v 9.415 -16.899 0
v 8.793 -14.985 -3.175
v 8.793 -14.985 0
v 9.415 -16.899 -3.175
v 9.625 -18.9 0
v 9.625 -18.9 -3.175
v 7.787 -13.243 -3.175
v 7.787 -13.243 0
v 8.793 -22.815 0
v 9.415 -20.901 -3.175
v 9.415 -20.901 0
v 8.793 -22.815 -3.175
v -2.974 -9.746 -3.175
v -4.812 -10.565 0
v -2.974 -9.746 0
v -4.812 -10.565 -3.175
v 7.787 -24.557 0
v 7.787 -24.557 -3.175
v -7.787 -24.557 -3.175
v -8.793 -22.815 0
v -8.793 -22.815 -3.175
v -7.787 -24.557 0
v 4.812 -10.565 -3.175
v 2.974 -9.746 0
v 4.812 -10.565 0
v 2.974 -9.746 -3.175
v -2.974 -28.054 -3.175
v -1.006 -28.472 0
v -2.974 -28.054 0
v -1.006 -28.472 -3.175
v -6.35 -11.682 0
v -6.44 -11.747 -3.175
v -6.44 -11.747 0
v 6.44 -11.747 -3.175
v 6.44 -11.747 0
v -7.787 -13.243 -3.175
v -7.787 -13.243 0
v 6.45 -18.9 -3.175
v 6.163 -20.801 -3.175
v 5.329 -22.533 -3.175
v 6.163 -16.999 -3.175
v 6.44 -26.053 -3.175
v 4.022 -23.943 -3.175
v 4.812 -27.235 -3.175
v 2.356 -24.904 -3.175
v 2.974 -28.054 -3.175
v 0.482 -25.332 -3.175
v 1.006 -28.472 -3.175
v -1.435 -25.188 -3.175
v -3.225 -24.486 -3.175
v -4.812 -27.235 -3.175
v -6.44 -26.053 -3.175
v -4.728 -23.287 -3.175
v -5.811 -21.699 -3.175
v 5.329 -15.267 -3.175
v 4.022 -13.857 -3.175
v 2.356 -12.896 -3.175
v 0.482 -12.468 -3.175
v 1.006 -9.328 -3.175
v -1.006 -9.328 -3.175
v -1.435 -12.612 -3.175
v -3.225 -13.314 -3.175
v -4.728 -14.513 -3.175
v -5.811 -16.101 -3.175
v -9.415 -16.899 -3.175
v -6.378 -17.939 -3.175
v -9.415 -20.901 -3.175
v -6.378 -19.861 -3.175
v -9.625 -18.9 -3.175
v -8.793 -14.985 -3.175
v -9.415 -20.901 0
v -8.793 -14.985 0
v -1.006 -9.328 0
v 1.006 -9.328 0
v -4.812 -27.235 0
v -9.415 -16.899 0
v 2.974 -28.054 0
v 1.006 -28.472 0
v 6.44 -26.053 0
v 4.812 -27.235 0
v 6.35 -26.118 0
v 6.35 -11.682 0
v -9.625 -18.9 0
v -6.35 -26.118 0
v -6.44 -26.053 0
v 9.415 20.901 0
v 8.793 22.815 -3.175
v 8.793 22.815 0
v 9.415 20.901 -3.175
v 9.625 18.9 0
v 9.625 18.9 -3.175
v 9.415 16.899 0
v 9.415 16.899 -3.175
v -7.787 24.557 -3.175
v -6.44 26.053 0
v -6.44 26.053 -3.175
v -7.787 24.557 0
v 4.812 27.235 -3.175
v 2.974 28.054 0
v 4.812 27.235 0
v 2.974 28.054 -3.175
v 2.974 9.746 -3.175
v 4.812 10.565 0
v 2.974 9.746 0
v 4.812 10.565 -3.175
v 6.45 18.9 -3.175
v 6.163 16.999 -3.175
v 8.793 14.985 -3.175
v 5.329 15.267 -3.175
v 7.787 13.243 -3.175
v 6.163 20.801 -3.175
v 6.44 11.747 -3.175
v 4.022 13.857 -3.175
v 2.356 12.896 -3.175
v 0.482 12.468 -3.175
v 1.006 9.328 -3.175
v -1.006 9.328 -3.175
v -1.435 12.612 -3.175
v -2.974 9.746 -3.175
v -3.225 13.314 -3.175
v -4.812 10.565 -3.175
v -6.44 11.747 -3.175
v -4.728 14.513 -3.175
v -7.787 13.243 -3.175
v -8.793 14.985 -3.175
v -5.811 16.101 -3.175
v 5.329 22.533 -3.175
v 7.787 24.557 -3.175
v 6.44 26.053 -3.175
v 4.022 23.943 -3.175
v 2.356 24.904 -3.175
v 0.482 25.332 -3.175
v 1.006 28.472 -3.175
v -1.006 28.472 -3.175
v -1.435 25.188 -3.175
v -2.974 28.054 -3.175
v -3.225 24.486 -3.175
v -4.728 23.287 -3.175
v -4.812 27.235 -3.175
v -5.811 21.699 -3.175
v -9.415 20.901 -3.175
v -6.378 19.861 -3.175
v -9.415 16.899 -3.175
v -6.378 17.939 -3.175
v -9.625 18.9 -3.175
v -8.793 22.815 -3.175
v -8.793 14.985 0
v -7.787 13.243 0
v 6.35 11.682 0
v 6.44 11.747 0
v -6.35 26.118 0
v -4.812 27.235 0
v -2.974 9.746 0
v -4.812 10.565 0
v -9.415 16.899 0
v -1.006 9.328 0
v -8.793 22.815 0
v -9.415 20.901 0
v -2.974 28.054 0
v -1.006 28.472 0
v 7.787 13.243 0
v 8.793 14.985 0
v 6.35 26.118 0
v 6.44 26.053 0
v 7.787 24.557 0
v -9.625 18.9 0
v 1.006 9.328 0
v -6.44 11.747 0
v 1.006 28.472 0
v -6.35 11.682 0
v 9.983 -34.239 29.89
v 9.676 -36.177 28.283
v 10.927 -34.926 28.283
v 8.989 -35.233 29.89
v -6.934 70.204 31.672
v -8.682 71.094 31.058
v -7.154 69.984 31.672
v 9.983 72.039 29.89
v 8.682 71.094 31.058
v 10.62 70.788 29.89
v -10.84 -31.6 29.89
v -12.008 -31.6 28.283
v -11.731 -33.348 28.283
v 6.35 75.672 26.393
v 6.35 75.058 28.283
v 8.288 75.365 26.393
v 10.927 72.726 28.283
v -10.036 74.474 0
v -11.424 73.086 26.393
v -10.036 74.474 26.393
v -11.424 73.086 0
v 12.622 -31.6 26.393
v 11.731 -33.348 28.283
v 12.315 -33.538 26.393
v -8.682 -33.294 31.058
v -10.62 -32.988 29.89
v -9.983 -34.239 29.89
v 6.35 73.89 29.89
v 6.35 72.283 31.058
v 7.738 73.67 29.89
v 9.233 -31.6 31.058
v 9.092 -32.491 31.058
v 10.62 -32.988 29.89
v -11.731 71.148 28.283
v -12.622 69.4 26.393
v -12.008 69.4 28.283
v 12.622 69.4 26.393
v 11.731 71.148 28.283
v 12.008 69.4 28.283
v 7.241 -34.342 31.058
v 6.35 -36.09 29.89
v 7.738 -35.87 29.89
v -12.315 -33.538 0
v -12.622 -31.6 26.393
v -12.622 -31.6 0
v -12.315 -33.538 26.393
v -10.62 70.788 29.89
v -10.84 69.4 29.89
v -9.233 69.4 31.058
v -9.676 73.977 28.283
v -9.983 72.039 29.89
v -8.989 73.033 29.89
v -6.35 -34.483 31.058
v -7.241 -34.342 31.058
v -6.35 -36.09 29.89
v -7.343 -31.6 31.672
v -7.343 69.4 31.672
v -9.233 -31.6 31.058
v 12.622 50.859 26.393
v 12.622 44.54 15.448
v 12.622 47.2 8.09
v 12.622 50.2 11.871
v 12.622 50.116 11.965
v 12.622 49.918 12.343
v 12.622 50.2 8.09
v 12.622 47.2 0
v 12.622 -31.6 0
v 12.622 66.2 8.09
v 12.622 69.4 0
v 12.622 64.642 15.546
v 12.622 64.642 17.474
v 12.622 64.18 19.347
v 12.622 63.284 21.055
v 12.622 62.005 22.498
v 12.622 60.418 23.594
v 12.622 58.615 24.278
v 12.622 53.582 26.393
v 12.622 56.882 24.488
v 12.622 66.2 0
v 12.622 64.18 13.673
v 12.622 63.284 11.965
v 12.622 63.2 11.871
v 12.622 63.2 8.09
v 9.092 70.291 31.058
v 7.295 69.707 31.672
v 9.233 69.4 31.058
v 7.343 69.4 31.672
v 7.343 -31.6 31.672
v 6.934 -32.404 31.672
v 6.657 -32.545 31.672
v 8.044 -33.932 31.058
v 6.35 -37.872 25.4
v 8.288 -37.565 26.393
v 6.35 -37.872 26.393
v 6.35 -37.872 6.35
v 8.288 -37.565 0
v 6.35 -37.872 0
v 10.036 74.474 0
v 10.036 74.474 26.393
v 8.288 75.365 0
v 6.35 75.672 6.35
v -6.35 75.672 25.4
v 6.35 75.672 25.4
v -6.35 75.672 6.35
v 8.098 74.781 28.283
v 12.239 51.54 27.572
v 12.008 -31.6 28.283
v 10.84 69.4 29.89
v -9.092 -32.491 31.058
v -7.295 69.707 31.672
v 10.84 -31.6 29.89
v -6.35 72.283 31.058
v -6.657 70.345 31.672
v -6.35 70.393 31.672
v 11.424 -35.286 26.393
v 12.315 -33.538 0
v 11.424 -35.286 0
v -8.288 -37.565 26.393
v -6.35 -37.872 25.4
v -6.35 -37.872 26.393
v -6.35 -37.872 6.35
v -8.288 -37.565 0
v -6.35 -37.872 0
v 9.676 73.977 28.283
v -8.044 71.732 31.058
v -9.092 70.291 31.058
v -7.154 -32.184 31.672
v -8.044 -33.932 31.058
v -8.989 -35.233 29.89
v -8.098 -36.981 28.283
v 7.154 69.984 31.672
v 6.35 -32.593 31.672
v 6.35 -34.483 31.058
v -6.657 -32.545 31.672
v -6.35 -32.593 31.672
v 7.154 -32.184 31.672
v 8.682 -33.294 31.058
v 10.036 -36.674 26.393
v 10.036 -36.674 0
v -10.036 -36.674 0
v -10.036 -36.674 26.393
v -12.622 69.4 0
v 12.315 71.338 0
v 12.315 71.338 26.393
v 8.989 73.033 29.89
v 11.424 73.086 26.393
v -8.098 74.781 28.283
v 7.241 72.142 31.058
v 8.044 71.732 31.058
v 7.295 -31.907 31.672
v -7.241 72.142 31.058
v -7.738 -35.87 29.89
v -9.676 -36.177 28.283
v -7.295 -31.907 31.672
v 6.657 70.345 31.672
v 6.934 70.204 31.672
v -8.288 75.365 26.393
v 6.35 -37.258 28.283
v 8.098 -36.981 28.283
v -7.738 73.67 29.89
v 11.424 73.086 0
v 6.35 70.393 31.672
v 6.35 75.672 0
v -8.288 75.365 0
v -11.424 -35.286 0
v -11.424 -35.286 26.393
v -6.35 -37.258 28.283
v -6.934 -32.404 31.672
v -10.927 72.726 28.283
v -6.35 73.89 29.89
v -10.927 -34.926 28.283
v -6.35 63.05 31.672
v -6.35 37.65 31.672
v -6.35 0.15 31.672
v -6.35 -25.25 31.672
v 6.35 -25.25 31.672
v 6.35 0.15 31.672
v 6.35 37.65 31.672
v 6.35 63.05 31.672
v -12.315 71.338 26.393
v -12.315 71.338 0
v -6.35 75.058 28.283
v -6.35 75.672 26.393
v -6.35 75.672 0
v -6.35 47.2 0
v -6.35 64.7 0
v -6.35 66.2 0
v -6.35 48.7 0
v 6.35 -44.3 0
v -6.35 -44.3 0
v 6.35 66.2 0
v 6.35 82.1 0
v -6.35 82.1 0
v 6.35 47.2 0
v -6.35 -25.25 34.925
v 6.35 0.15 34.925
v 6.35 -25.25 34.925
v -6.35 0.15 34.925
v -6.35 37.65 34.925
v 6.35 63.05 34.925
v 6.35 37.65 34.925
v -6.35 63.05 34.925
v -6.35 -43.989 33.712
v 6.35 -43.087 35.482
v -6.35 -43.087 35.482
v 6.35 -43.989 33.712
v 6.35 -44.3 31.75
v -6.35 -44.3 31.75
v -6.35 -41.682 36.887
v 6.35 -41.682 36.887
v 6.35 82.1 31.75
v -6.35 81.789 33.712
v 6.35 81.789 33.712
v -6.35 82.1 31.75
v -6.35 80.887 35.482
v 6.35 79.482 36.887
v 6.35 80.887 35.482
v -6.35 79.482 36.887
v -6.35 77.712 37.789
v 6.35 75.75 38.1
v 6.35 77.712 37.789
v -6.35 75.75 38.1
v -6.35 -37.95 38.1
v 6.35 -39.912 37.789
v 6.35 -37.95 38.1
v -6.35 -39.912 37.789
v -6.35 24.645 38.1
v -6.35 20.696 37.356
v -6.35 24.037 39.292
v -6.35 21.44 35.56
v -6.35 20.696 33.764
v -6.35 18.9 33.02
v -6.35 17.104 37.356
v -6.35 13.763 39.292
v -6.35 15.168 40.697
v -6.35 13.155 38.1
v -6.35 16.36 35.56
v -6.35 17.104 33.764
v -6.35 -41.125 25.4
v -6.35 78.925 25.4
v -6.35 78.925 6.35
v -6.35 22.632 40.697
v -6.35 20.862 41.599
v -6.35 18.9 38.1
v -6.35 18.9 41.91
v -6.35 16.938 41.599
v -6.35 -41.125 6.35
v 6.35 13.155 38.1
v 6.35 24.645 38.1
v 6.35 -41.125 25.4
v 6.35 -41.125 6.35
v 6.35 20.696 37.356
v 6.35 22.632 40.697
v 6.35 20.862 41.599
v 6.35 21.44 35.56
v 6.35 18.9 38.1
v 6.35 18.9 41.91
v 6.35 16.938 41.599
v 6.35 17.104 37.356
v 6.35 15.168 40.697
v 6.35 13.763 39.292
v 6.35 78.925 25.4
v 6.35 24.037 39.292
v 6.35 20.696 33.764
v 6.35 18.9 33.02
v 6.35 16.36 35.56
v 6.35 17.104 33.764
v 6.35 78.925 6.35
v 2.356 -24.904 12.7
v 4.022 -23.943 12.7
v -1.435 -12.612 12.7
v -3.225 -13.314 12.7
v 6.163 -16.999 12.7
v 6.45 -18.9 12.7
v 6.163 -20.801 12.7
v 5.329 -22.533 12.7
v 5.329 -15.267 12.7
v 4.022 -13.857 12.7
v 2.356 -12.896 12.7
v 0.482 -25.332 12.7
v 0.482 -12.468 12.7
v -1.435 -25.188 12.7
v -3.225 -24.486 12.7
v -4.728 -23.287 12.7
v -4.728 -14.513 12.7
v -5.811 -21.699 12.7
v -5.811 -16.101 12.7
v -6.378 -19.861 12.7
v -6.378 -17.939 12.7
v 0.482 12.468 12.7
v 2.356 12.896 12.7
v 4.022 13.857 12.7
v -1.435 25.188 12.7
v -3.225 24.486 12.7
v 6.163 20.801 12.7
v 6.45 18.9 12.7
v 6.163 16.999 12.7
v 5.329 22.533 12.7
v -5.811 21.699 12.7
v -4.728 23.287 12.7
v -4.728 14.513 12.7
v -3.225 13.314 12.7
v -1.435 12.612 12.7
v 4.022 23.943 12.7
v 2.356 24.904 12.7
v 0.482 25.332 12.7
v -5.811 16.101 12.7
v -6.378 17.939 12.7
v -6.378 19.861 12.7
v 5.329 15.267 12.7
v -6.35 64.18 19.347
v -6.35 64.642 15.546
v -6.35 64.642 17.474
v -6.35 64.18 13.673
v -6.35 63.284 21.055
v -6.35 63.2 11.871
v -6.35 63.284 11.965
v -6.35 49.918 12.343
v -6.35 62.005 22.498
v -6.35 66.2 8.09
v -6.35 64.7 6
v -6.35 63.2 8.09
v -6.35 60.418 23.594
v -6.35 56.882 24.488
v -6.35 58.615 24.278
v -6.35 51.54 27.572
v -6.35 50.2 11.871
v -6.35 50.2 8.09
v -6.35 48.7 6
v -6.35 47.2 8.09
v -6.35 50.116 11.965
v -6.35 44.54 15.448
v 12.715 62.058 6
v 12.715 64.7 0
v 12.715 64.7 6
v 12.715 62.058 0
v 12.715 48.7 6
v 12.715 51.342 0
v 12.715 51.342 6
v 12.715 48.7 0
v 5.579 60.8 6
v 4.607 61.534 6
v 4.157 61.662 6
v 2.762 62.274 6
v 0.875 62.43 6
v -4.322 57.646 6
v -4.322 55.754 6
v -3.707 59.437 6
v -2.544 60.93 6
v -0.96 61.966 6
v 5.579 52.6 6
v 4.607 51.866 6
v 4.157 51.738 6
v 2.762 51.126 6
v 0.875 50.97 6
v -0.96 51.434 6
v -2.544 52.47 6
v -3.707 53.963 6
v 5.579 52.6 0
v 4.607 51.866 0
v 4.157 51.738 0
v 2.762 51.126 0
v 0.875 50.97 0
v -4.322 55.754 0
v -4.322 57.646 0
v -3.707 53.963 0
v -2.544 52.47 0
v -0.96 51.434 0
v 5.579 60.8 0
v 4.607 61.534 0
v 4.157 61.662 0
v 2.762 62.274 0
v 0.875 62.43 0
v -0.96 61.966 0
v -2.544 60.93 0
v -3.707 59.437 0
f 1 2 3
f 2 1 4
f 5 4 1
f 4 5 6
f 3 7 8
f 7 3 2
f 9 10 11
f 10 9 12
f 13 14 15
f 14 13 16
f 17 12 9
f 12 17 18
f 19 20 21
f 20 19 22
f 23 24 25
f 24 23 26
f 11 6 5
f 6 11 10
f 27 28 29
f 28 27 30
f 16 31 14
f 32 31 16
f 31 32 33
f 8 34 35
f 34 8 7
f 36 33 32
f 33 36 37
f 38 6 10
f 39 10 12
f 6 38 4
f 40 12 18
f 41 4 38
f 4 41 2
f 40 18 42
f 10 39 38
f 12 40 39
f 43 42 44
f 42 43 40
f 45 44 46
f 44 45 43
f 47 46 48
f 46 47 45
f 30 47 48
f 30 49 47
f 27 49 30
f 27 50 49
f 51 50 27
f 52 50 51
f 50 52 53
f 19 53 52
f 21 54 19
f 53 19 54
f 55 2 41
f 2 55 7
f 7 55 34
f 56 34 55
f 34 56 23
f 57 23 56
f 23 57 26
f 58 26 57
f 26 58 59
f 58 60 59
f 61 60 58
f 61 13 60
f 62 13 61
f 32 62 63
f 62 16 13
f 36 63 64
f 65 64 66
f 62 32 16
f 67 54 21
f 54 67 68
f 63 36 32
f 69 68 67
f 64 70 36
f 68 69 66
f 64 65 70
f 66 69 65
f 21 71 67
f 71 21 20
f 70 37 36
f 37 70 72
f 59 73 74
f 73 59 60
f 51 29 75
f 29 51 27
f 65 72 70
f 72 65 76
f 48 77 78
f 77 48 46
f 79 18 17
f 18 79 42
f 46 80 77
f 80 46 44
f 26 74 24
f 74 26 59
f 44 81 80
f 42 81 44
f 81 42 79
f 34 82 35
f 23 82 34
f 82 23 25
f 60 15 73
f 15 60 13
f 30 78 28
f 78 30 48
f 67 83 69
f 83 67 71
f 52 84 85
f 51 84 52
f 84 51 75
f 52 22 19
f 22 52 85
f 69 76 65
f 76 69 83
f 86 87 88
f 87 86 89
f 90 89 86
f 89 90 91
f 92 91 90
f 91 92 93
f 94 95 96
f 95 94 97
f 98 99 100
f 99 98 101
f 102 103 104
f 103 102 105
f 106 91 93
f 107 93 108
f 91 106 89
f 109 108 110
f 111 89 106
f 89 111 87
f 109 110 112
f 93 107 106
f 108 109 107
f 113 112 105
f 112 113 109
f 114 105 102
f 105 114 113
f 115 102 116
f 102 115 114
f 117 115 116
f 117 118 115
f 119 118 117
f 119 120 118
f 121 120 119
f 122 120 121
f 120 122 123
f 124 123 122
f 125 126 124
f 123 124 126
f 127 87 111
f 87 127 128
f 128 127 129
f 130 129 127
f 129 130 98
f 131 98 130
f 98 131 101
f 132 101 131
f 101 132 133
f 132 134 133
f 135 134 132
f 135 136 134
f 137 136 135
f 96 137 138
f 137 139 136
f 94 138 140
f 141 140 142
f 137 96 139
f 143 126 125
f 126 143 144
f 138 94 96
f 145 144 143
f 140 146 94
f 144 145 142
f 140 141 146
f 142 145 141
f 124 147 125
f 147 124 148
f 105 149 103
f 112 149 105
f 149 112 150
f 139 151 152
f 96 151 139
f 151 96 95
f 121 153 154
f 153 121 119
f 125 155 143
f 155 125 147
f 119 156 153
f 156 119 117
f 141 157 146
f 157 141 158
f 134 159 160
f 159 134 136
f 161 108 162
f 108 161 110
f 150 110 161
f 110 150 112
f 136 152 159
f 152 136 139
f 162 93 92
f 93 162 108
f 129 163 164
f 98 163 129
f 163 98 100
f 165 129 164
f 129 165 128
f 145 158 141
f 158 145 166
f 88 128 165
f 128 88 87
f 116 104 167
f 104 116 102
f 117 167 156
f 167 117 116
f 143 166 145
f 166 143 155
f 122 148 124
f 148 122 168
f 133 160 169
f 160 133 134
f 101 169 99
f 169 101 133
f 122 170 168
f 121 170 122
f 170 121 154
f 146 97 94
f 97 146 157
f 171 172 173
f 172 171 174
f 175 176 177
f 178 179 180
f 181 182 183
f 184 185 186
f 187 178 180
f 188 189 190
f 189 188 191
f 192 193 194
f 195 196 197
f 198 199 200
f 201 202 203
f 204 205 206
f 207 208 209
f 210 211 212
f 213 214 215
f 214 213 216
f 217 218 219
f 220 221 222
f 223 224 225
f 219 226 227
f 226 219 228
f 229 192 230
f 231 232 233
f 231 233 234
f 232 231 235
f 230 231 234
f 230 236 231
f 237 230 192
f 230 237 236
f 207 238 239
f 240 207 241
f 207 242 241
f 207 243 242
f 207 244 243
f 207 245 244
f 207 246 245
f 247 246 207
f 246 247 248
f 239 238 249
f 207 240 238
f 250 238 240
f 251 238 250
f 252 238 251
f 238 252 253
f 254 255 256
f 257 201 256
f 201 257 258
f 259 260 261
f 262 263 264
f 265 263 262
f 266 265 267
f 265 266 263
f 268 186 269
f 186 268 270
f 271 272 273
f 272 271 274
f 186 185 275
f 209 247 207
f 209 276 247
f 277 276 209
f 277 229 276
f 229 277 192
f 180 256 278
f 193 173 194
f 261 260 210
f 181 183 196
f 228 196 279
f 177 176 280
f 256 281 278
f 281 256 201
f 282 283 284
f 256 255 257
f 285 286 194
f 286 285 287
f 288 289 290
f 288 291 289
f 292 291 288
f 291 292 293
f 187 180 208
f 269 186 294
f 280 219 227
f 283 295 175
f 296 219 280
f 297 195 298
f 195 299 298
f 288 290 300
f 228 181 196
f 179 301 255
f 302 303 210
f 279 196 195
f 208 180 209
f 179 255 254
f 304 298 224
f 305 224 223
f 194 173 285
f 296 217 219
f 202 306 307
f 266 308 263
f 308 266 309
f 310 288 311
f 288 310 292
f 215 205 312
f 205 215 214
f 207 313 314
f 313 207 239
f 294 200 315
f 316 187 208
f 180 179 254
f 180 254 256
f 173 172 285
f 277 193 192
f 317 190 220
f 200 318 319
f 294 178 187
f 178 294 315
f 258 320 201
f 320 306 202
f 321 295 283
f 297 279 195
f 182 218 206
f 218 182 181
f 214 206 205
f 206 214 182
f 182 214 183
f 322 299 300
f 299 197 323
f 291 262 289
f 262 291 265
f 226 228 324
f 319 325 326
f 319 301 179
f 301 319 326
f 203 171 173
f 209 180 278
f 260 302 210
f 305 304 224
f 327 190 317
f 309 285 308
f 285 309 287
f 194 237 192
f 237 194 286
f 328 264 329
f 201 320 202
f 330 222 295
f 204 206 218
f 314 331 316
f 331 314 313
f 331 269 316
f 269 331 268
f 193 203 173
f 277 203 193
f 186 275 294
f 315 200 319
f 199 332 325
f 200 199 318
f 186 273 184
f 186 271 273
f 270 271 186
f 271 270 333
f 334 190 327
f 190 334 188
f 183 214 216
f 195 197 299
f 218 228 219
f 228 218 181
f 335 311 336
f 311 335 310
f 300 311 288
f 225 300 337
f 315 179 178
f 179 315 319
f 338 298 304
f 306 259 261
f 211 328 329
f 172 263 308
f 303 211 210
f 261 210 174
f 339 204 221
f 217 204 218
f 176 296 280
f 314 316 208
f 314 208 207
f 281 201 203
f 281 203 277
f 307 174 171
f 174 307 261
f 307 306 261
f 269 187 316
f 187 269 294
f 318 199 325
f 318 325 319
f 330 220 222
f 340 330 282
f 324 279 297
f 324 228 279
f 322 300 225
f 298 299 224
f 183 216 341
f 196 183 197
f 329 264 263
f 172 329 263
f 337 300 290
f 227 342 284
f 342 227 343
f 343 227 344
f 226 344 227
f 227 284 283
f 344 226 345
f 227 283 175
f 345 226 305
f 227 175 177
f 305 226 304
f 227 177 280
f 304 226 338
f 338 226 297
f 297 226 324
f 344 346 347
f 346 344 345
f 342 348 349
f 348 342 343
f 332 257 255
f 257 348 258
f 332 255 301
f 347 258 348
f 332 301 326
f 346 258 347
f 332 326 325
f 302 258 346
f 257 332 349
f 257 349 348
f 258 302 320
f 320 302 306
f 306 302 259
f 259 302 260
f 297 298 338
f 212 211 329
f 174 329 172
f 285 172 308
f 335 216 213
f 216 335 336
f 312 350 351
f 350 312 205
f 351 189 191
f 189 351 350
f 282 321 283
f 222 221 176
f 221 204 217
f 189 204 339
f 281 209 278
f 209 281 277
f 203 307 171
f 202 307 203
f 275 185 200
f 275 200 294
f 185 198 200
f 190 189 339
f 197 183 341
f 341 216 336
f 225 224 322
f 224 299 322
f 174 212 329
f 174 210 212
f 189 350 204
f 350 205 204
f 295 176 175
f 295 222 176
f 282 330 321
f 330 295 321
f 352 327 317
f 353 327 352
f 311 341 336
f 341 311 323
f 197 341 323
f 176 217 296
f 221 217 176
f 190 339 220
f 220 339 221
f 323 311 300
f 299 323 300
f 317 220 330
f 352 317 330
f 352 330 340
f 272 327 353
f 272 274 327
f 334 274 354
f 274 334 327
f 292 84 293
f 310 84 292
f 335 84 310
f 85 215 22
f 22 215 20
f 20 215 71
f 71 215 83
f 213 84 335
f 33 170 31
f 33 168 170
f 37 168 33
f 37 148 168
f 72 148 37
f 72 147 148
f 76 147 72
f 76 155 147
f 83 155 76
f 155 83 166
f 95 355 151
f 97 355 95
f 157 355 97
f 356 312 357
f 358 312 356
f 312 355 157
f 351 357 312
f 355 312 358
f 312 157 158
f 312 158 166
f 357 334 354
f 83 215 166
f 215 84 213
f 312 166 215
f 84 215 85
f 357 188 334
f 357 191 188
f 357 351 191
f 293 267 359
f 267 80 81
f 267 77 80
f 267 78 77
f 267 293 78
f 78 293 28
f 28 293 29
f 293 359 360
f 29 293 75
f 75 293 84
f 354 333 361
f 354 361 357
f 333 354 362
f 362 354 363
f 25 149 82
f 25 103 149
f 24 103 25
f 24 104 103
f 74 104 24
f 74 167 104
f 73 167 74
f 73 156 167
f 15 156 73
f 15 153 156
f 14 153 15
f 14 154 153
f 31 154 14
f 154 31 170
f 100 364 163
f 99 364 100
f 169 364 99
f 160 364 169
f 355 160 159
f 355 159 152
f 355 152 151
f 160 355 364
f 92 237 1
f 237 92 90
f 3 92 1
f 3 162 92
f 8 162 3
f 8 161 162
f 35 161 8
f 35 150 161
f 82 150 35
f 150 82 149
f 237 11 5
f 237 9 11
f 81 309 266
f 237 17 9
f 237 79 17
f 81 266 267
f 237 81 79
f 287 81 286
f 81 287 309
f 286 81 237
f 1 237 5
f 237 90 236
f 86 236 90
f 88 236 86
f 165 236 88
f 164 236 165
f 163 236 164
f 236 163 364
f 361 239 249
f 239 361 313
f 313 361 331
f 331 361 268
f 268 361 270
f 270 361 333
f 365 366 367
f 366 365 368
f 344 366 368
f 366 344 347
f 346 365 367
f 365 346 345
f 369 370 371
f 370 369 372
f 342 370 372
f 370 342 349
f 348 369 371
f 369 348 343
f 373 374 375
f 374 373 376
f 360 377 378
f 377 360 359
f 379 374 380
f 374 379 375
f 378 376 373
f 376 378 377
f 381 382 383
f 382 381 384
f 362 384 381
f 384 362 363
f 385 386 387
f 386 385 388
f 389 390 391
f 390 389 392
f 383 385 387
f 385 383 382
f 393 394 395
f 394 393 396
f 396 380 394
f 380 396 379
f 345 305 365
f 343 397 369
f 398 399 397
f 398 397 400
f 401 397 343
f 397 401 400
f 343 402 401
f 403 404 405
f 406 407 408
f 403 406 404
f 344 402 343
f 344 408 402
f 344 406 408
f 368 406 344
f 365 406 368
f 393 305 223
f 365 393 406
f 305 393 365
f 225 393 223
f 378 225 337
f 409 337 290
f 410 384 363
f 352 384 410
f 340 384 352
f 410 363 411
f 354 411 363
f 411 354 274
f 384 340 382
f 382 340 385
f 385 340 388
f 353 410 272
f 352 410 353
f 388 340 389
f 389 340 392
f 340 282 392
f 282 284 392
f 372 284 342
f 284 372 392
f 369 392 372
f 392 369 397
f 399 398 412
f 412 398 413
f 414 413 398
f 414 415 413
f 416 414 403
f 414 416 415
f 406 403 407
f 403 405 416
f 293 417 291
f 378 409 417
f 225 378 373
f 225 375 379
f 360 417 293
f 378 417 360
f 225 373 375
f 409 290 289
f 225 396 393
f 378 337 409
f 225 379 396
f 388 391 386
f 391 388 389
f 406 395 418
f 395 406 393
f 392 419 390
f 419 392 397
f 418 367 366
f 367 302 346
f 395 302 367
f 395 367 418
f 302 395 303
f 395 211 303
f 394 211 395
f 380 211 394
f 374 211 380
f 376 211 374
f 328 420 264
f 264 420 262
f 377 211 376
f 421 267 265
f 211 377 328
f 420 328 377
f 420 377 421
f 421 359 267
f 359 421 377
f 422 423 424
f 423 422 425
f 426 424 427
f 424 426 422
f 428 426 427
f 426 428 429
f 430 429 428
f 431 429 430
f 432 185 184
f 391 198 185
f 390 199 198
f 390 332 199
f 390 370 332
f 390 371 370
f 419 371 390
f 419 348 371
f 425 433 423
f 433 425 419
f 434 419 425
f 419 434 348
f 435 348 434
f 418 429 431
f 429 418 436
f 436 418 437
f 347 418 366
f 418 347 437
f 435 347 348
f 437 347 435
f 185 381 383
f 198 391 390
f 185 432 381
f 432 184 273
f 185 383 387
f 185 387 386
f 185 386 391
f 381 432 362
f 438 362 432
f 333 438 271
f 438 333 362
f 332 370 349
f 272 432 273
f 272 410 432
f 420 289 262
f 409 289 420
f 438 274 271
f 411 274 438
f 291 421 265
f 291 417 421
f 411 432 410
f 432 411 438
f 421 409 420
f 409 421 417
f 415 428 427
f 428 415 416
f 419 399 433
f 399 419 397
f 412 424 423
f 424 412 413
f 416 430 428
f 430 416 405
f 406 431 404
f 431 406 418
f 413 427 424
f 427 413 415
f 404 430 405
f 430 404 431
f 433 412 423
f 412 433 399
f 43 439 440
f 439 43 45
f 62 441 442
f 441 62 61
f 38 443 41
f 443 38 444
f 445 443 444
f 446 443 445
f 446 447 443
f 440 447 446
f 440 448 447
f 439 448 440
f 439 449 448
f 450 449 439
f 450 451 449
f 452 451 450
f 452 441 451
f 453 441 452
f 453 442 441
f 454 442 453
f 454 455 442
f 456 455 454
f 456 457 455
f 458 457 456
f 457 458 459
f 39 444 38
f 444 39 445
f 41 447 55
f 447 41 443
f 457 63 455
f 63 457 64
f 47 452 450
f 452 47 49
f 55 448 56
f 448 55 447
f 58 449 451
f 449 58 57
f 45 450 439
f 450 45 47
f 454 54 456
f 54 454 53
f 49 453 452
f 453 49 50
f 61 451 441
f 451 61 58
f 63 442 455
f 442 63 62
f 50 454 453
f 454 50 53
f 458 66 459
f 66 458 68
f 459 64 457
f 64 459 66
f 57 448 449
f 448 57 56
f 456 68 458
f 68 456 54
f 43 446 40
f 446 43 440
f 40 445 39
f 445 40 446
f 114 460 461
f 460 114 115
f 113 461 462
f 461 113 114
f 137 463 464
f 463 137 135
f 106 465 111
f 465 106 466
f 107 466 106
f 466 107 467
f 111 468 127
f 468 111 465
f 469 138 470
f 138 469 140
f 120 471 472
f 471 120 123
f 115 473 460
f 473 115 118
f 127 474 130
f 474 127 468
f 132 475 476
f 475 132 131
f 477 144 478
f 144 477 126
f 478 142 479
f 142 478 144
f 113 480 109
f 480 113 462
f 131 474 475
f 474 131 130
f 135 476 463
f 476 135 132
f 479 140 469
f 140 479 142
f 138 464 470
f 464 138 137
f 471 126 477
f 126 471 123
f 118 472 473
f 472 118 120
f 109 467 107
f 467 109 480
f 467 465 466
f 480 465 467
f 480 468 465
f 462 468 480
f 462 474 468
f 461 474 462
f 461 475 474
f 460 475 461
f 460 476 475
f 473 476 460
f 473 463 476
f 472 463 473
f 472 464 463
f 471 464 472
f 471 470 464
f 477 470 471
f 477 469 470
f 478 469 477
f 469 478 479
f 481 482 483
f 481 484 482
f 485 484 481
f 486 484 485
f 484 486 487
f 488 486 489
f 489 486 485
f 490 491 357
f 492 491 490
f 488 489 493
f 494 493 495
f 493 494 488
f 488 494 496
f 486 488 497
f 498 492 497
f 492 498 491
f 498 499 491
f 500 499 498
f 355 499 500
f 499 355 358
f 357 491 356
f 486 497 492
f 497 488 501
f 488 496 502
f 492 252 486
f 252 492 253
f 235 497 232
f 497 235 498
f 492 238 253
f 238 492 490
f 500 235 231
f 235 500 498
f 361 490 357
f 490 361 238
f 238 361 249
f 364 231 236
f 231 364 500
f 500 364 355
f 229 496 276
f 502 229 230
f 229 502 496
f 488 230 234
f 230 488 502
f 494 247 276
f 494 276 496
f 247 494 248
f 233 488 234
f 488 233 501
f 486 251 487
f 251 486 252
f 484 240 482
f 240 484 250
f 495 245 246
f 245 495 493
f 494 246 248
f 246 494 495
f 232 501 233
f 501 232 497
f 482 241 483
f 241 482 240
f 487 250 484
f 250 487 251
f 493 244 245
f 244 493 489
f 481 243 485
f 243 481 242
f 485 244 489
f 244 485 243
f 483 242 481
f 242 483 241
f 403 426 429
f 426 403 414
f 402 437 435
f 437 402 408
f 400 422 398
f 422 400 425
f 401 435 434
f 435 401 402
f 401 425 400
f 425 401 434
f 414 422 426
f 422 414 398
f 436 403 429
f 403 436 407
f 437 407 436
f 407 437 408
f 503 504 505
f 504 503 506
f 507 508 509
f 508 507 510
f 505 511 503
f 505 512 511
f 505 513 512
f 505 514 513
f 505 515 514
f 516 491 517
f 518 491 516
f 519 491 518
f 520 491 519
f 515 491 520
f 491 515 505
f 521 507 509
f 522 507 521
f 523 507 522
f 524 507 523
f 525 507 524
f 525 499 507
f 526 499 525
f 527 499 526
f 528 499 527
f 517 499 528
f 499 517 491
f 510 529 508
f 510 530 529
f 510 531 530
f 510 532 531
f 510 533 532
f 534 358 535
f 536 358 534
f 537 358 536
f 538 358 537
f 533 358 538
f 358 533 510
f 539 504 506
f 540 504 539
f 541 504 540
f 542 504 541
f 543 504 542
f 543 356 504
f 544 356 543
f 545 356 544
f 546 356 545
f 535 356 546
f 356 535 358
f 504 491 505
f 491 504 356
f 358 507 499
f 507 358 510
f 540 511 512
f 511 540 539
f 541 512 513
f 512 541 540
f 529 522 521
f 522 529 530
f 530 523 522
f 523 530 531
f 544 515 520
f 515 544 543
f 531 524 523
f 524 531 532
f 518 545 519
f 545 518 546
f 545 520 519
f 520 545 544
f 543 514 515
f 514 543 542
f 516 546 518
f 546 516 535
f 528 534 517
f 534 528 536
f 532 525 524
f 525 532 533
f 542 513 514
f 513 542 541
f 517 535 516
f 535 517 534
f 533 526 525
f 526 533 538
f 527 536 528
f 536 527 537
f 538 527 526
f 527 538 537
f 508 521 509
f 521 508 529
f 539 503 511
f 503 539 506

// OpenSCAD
// [FL_INDEX: keywords="openscad, 3d_parametric, Customizable_air_compressor_tool_caddy, csg_solid" | COT="Parametric OpenSCAD design from 3DCodeverse"]
// Title: Customizable air compressor tool caddy

//air compressor tool caddy
//designed by: Andrew Herren
//modified: 7/22/13

// preview[view:east, tilt:bottom diagonal]
tools=2; //[1:10]
spacing=25.2*1.5;
center_hanger=1; //[1:On,0:Off]
pressure_guage=1; //[1:On,0:Off]



difference(){
union(){
if(center_hanger==1 || tools==1){
translate([-25.4/4,pressure_guage*spacing/2,25.4*1.4])rotate([0,90,0])cylinder(25.4/2,25.4/4,25.4/4);
}
for(i=[0:tools-1]){
translate([0,((-25.4*2-(tools-1)*spacing)/2)+25.4+(i*spacing),-25.4/8])cylinder(25.4,6.45+(25.4/8),6.45+(25.4/8));
}
difference(){
translate([25.4/4,(((tools-1)*spacing)+(25.4*1.25))/2,0])minkowski(){
translate([-25.4/4,(-(25.4*.75)-(tools-1)*spacing)/2,0])sphere(25.4/4);
translate([-25.4/4,(-25.4*1.5-(tools-1)*spacing)/2,0])cube([25.4/2,((tools-1)*spacing)+25.4+(pressure_guage*spacing),25.4]);
}
translate([-25.4,-(tools*spacing+(2*25.4))/2,-20])cube([25.4*2,tools*spacing+(2*25.4)+(pressure_guage*spacing),20]);
}
difference(){
hull(){
translate([-25.4/4,-(((tools-1)*spacing)+(25.4*2))/2,0])cube([25.4/2,((tools-1)*spacing)+(25.4*2)+(pressure_guage*spacing),25.4]);
translate([-25.4/4,-(((tools-1)*spacing)+25.4*1.5)/2,25.4*1.25])rotate([0,90,0])cylinder(25.4/2,25.4/4,25.4/4);
translate([-25.4/4,(((tools-1)*spacing)+25.4*1.5)/2+(pressure_guage*spacing),25.4*1.25])rotate([0,90,0])cylinder(25.4/2,25.4/4,25.4/4);
}
translate([-25.4/2,-(((tools-1)*spacing)+(25.4*1.75))/2,25.4/4])cube([25.4,((tools-1)*spacing)+(25.4*1.75)+(pressure_guage*spacing),25.4*.75]);
if(tools>1){
translate([-25.4/2,((-25.4/2)-(tools-1)*spacing)/2,25.4*(5/8)])cube([25.4,25.4,25.4*.75]);
translate([-25.4/2,((-25.4*1.5)+(tools-1)*spacing)/2+(pressure_guage*spacing),25.4*(5/8)])cube([25.4,25.4,25.4*.75]);
}
}
}
if(center_hanger==1 || tools==1){
translate([-25.4/2,(pressure_guage*spacing)/2,25.4*1.4])rotate([0,90,0])cylinder(25.4,25.4/10,25.4/10);
}
for(i=[0:tools-1]){
translate([0,((-25.4*2-(tools-1)*spacing)/2)+25.4+(i*spacing),-25.4/2])cylinder(25.4,6.45,6.45);
}
if(pressure_guage==1){
translate([-25.4*.25,((-25.4*2-(tools-1)*spacing)/2)+25.4+(tools*spacing)-6.5,-25.4*1.45])cube([25.42,13,50]);
translate([-25.4*.25,((-25.4*2-(tools-1)*spacing)/2)+25.4+(tools*spacing)-9.5,-25.4*1.65])cube([25.42,19,50]);
translate([-25.4*.25,((-25.4*2-(tools-1)*spacing)/2)+25.4+(tools*spacing),25.4*.65])rotate([60,0,0])translate([0,-7,0])cube([25.4,14,10]);
translate([-25.4*.25,((-25.4*2-(tools-1)*spacing)/2)+25.4+(tools*spacing),25.4*.65])rotate([0,90,0])cylinder(25.42,8,8);
}
}

if(pressure_guage==1){
difference(){
translate([-25.4*.25,((-25.4*2-(tools-1)*spacing)/2)+25.4+(tools*spacing)-8,0])cube([25.42*.75,16,6]);
translate([(25.4*.25)-4.15,((-25.4*2-(tools-1)*spacing)/2)+25.4+(tools*spacing),-2])cylinder(10,5.4,5.4);
translate([(25.4*.25)-5,((-25.4*2-(tools-1)*spacing)/2)+25.4+(tools*spacing),-2])cylinder(10,5.75,5.75);
translate([(25.4*.25)-4.85,((-25.4*2-(tools-1)*spacing)/2)+25.4+(tools*spacing)-3,-2])cube([25.42*.5,6,10]);
translate([(25.4*.5)-4.85,((-25.4*2-(tools-1)*spacing)/2)+25.4+(tools*spacing)-4.5,-2])rotate([0,0,-10])translate([-25.4*.25,0,0])cube([25.42*.5,4,10]);
translate([(25.4*.5)-4.85,((-25.4*2-(tools-1)*spacing)/2)+25.4+(tools*spacing)+4.5,-2])rotate([0,0,10])translate([-25.4*.25,-4,0])cube([25.42*.5,4,10]);
}
}
